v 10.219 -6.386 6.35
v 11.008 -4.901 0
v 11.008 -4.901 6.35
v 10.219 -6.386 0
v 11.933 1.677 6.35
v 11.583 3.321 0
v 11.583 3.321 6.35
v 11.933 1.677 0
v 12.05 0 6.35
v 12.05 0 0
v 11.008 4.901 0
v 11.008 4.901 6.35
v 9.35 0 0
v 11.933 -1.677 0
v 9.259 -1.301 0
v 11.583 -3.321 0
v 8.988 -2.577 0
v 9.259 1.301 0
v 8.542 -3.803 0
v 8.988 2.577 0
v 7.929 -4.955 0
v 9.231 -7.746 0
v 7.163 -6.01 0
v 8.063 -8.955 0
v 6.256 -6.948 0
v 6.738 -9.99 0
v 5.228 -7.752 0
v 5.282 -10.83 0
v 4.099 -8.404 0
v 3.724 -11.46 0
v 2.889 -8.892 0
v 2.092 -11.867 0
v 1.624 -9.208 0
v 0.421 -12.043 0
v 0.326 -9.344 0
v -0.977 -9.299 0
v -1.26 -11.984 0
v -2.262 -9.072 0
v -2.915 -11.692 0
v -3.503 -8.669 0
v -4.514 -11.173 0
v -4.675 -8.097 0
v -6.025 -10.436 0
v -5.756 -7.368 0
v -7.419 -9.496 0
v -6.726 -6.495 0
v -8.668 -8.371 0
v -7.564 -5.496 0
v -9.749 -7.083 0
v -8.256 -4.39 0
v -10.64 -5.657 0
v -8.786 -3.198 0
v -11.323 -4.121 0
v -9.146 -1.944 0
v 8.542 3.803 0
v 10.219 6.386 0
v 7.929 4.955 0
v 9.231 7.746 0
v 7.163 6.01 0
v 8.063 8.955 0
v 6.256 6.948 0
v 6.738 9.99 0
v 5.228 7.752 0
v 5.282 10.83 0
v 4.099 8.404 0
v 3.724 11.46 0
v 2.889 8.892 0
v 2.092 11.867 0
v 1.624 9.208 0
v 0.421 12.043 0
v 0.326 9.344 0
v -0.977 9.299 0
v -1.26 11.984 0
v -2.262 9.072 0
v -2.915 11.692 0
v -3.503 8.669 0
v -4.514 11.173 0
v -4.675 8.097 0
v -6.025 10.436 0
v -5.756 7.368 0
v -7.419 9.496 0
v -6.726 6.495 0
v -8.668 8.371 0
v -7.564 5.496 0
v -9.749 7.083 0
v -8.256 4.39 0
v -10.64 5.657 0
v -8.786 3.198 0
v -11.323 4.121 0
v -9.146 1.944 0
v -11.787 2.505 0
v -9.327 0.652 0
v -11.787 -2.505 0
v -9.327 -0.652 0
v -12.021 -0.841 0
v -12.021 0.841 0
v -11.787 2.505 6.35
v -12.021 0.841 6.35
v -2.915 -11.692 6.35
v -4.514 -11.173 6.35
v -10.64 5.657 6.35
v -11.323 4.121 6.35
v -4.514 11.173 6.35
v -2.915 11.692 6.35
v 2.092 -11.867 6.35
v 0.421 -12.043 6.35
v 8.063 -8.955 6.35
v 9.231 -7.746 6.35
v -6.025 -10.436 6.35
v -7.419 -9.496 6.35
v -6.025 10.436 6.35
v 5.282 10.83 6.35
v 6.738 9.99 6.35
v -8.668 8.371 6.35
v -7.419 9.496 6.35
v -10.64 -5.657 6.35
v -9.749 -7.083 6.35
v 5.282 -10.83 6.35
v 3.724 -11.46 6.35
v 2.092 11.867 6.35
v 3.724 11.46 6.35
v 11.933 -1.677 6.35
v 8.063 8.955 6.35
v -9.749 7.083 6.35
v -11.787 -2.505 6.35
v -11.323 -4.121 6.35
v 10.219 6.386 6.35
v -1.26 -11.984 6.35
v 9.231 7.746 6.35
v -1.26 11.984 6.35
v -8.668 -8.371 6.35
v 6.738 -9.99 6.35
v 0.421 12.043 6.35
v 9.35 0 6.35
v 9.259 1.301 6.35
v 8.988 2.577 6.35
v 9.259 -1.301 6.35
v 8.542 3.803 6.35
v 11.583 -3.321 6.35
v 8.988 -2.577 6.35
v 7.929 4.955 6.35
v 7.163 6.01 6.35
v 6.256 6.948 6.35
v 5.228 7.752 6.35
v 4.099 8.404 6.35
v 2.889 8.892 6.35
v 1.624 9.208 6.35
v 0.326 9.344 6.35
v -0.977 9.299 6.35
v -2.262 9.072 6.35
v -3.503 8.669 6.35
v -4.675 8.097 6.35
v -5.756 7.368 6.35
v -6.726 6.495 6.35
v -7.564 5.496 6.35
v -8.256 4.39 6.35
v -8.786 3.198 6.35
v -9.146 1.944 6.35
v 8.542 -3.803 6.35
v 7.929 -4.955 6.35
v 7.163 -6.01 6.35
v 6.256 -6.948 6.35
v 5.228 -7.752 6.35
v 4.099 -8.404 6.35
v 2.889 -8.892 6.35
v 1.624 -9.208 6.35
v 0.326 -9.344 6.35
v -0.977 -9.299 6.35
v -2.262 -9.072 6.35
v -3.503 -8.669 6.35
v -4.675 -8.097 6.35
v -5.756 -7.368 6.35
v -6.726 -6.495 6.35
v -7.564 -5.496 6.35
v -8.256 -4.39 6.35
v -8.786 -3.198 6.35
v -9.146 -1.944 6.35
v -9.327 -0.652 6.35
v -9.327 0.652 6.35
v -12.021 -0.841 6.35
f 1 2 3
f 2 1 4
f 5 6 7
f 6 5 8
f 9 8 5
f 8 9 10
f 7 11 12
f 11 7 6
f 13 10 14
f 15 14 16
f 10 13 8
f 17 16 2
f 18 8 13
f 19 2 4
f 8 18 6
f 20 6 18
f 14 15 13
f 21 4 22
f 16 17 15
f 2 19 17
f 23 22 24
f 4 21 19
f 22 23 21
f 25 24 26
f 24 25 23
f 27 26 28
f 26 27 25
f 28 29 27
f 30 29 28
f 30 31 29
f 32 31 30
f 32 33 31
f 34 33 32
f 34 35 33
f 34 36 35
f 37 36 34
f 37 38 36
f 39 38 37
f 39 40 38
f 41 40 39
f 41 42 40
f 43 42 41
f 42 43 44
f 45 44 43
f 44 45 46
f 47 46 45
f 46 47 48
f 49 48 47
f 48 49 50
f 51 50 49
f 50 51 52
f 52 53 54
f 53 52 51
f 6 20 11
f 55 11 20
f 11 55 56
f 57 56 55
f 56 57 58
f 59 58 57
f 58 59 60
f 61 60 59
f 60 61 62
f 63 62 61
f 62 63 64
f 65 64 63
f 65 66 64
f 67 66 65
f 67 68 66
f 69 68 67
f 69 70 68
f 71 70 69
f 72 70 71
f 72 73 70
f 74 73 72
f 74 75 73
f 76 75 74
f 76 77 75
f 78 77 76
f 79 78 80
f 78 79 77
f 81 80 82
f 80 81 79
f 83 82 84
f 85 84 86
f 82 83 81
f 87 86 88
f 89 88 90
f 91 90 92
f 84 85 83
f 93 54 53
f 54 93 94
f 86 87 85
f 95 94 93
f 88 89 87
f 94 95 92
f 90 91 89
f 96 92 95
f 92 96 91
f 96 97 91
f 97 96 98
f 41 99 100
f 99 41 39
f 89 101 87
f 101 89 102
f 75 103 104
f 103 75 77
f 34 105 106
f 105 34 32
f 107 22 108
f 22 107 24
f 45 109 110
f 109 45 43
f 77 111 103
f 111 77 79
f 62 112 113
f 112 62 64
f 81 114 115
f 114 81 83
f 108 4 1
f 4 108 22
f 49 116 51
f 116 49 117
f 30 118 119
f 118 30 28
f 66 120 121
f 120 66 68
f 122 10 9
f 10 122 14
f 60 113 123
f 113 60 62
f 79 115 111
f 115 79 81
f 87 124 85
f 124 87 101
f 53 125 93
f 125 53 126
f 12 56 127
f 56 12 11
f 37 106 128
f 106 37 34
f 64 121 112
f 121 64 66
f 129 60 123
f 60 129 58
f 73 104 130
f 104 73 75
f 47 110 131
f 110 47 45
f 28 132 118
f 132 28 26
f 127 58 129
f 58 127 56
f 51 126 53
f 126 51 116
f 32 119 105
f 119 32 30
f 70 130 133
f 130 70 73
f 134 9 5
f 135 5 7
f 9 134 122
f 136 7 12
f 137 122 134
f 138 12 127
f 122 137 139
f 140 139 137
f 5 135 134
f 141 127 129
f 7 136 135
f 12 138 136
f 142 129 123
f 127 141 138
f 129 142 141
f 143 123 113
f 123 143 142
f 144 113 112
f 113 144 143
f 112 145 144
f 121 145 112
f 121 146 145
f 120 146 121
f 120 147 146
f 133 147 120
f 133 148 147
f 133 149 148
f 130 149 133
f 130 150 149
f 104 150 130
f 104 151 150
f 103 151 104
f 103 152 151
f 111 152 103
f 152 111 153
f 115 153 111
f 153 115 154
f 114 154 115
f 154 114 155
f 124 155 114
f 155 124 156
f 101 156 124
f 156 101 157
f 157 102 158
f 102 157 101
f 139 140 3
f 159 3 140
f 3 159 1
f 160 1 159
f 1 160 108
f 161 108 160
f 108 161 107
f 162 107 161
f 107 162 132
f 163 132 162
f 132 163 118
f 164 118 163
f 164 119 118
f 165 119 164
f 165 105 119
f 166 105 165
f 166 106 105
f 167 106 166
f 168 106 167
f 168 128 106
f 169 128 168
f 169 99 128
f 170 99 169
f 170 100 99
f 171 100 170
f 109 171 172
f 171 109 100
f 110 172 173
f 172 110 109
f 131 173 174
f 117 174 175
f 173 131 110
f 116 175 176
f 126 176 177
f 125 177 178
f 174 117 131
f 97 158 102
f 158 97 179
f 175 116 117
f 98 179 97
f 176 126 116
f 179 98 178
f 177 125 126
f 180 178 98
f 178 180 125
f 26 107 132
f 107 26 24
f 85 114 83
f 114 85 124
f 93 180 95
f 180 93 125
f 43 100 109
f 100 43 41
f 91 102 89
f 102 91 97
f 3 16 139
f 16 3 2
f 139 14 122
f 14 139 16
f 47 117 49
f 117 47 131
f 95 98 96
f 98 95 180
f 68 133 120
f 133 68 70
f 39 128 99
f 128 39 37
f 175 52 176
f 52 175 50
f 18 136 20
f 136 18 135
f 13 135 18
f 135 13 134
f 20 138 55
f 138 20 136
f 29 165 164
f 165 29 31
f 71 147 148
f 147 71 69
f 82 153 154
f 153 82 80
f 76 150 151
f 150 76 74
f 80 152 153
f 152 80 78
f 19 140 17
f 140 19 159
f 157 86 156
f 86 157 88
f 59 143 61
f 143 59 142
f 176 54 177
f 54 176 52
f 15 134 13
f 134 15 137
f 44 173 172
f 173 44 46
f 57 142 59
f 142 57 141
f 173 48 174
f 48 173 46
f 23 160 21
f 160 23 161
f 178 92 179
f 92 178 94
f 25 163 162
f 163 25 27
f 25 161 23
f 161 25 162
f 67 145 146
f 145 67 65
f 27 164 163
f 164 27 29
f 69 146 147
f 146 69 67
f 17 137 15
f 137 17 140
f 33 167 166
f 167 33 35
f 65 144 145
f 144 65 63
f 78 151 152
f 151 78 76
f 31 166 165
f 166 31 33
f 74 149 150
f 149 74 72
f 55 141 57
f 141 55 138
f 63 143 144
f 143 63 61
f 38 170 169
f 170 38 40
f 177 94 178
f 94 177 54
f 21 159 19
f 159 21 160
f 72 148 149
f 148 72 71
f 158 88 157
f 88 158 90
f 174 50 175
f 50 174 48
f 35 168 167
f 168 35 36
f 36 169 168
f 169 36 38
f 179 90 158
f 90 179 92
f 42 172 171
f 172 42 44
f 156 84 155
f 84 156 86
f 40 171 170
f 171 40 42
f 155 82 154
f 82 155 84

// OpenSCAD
// file: dimensions.scad
$fn = 45;
// mm per inch
mmpi = 25.4;

//ENGINE DIMENSIONS
motor_r = 29/2; //mm
motor_l = 156; //mm

//ENGINE BAY
engineHousingOD = 18.7; //mm
engineHousingID = 18.0; //mm
engineHousingLength = 69.8; //mm

//MAIN BODY
mainHousing_l = 457; //mm
mainHousing_r = 25/2; //mm
mainHousing_ri = 24/2; //mm

//MAIN FINS
finRoot = 50.8; //mm
finHeight = 31.8; //mm
finSweep = 38.1; //mm
finSweepTheta = 50.2; //deg
finThickness = 2.39; //mm
finCount = 3;

//SUB FINS
subRoot = 57.2; //mm
subHeight = 6.35; //mm
subSweep = 50.8; //mm
subSweepTheta = 82.9; //deg
subThickness = 2.39; //mm
subCount = 3;
subPosition = 70;

//LAUNCH LUG
lugLength = 25.4; //mm
ludOD = 5.96; //mm
lugID = 3.96; //mm

//RINGS
ringOD = 24.1; //mm
ringID = 18.7; //mm
ringThickness = 6.35; //mm

//PAYLOAD
//ENGINE RETENTION
//NOSE CONE
//noseBaseOD = 24.8; //mm
noseBaseOD = 45; //mm
noseHeight = 76.2; //mm
noseThickness = .99; //mm
noseShoulderLength = 19; //mm
// main file
include<dimensions.scad>;
//RINGS (PRINT 2)
difference(){
	cylinder(r=ringOD/2, h=ringThickness);
	cylinder(r=ringID/2, h =ringThickness);
}
